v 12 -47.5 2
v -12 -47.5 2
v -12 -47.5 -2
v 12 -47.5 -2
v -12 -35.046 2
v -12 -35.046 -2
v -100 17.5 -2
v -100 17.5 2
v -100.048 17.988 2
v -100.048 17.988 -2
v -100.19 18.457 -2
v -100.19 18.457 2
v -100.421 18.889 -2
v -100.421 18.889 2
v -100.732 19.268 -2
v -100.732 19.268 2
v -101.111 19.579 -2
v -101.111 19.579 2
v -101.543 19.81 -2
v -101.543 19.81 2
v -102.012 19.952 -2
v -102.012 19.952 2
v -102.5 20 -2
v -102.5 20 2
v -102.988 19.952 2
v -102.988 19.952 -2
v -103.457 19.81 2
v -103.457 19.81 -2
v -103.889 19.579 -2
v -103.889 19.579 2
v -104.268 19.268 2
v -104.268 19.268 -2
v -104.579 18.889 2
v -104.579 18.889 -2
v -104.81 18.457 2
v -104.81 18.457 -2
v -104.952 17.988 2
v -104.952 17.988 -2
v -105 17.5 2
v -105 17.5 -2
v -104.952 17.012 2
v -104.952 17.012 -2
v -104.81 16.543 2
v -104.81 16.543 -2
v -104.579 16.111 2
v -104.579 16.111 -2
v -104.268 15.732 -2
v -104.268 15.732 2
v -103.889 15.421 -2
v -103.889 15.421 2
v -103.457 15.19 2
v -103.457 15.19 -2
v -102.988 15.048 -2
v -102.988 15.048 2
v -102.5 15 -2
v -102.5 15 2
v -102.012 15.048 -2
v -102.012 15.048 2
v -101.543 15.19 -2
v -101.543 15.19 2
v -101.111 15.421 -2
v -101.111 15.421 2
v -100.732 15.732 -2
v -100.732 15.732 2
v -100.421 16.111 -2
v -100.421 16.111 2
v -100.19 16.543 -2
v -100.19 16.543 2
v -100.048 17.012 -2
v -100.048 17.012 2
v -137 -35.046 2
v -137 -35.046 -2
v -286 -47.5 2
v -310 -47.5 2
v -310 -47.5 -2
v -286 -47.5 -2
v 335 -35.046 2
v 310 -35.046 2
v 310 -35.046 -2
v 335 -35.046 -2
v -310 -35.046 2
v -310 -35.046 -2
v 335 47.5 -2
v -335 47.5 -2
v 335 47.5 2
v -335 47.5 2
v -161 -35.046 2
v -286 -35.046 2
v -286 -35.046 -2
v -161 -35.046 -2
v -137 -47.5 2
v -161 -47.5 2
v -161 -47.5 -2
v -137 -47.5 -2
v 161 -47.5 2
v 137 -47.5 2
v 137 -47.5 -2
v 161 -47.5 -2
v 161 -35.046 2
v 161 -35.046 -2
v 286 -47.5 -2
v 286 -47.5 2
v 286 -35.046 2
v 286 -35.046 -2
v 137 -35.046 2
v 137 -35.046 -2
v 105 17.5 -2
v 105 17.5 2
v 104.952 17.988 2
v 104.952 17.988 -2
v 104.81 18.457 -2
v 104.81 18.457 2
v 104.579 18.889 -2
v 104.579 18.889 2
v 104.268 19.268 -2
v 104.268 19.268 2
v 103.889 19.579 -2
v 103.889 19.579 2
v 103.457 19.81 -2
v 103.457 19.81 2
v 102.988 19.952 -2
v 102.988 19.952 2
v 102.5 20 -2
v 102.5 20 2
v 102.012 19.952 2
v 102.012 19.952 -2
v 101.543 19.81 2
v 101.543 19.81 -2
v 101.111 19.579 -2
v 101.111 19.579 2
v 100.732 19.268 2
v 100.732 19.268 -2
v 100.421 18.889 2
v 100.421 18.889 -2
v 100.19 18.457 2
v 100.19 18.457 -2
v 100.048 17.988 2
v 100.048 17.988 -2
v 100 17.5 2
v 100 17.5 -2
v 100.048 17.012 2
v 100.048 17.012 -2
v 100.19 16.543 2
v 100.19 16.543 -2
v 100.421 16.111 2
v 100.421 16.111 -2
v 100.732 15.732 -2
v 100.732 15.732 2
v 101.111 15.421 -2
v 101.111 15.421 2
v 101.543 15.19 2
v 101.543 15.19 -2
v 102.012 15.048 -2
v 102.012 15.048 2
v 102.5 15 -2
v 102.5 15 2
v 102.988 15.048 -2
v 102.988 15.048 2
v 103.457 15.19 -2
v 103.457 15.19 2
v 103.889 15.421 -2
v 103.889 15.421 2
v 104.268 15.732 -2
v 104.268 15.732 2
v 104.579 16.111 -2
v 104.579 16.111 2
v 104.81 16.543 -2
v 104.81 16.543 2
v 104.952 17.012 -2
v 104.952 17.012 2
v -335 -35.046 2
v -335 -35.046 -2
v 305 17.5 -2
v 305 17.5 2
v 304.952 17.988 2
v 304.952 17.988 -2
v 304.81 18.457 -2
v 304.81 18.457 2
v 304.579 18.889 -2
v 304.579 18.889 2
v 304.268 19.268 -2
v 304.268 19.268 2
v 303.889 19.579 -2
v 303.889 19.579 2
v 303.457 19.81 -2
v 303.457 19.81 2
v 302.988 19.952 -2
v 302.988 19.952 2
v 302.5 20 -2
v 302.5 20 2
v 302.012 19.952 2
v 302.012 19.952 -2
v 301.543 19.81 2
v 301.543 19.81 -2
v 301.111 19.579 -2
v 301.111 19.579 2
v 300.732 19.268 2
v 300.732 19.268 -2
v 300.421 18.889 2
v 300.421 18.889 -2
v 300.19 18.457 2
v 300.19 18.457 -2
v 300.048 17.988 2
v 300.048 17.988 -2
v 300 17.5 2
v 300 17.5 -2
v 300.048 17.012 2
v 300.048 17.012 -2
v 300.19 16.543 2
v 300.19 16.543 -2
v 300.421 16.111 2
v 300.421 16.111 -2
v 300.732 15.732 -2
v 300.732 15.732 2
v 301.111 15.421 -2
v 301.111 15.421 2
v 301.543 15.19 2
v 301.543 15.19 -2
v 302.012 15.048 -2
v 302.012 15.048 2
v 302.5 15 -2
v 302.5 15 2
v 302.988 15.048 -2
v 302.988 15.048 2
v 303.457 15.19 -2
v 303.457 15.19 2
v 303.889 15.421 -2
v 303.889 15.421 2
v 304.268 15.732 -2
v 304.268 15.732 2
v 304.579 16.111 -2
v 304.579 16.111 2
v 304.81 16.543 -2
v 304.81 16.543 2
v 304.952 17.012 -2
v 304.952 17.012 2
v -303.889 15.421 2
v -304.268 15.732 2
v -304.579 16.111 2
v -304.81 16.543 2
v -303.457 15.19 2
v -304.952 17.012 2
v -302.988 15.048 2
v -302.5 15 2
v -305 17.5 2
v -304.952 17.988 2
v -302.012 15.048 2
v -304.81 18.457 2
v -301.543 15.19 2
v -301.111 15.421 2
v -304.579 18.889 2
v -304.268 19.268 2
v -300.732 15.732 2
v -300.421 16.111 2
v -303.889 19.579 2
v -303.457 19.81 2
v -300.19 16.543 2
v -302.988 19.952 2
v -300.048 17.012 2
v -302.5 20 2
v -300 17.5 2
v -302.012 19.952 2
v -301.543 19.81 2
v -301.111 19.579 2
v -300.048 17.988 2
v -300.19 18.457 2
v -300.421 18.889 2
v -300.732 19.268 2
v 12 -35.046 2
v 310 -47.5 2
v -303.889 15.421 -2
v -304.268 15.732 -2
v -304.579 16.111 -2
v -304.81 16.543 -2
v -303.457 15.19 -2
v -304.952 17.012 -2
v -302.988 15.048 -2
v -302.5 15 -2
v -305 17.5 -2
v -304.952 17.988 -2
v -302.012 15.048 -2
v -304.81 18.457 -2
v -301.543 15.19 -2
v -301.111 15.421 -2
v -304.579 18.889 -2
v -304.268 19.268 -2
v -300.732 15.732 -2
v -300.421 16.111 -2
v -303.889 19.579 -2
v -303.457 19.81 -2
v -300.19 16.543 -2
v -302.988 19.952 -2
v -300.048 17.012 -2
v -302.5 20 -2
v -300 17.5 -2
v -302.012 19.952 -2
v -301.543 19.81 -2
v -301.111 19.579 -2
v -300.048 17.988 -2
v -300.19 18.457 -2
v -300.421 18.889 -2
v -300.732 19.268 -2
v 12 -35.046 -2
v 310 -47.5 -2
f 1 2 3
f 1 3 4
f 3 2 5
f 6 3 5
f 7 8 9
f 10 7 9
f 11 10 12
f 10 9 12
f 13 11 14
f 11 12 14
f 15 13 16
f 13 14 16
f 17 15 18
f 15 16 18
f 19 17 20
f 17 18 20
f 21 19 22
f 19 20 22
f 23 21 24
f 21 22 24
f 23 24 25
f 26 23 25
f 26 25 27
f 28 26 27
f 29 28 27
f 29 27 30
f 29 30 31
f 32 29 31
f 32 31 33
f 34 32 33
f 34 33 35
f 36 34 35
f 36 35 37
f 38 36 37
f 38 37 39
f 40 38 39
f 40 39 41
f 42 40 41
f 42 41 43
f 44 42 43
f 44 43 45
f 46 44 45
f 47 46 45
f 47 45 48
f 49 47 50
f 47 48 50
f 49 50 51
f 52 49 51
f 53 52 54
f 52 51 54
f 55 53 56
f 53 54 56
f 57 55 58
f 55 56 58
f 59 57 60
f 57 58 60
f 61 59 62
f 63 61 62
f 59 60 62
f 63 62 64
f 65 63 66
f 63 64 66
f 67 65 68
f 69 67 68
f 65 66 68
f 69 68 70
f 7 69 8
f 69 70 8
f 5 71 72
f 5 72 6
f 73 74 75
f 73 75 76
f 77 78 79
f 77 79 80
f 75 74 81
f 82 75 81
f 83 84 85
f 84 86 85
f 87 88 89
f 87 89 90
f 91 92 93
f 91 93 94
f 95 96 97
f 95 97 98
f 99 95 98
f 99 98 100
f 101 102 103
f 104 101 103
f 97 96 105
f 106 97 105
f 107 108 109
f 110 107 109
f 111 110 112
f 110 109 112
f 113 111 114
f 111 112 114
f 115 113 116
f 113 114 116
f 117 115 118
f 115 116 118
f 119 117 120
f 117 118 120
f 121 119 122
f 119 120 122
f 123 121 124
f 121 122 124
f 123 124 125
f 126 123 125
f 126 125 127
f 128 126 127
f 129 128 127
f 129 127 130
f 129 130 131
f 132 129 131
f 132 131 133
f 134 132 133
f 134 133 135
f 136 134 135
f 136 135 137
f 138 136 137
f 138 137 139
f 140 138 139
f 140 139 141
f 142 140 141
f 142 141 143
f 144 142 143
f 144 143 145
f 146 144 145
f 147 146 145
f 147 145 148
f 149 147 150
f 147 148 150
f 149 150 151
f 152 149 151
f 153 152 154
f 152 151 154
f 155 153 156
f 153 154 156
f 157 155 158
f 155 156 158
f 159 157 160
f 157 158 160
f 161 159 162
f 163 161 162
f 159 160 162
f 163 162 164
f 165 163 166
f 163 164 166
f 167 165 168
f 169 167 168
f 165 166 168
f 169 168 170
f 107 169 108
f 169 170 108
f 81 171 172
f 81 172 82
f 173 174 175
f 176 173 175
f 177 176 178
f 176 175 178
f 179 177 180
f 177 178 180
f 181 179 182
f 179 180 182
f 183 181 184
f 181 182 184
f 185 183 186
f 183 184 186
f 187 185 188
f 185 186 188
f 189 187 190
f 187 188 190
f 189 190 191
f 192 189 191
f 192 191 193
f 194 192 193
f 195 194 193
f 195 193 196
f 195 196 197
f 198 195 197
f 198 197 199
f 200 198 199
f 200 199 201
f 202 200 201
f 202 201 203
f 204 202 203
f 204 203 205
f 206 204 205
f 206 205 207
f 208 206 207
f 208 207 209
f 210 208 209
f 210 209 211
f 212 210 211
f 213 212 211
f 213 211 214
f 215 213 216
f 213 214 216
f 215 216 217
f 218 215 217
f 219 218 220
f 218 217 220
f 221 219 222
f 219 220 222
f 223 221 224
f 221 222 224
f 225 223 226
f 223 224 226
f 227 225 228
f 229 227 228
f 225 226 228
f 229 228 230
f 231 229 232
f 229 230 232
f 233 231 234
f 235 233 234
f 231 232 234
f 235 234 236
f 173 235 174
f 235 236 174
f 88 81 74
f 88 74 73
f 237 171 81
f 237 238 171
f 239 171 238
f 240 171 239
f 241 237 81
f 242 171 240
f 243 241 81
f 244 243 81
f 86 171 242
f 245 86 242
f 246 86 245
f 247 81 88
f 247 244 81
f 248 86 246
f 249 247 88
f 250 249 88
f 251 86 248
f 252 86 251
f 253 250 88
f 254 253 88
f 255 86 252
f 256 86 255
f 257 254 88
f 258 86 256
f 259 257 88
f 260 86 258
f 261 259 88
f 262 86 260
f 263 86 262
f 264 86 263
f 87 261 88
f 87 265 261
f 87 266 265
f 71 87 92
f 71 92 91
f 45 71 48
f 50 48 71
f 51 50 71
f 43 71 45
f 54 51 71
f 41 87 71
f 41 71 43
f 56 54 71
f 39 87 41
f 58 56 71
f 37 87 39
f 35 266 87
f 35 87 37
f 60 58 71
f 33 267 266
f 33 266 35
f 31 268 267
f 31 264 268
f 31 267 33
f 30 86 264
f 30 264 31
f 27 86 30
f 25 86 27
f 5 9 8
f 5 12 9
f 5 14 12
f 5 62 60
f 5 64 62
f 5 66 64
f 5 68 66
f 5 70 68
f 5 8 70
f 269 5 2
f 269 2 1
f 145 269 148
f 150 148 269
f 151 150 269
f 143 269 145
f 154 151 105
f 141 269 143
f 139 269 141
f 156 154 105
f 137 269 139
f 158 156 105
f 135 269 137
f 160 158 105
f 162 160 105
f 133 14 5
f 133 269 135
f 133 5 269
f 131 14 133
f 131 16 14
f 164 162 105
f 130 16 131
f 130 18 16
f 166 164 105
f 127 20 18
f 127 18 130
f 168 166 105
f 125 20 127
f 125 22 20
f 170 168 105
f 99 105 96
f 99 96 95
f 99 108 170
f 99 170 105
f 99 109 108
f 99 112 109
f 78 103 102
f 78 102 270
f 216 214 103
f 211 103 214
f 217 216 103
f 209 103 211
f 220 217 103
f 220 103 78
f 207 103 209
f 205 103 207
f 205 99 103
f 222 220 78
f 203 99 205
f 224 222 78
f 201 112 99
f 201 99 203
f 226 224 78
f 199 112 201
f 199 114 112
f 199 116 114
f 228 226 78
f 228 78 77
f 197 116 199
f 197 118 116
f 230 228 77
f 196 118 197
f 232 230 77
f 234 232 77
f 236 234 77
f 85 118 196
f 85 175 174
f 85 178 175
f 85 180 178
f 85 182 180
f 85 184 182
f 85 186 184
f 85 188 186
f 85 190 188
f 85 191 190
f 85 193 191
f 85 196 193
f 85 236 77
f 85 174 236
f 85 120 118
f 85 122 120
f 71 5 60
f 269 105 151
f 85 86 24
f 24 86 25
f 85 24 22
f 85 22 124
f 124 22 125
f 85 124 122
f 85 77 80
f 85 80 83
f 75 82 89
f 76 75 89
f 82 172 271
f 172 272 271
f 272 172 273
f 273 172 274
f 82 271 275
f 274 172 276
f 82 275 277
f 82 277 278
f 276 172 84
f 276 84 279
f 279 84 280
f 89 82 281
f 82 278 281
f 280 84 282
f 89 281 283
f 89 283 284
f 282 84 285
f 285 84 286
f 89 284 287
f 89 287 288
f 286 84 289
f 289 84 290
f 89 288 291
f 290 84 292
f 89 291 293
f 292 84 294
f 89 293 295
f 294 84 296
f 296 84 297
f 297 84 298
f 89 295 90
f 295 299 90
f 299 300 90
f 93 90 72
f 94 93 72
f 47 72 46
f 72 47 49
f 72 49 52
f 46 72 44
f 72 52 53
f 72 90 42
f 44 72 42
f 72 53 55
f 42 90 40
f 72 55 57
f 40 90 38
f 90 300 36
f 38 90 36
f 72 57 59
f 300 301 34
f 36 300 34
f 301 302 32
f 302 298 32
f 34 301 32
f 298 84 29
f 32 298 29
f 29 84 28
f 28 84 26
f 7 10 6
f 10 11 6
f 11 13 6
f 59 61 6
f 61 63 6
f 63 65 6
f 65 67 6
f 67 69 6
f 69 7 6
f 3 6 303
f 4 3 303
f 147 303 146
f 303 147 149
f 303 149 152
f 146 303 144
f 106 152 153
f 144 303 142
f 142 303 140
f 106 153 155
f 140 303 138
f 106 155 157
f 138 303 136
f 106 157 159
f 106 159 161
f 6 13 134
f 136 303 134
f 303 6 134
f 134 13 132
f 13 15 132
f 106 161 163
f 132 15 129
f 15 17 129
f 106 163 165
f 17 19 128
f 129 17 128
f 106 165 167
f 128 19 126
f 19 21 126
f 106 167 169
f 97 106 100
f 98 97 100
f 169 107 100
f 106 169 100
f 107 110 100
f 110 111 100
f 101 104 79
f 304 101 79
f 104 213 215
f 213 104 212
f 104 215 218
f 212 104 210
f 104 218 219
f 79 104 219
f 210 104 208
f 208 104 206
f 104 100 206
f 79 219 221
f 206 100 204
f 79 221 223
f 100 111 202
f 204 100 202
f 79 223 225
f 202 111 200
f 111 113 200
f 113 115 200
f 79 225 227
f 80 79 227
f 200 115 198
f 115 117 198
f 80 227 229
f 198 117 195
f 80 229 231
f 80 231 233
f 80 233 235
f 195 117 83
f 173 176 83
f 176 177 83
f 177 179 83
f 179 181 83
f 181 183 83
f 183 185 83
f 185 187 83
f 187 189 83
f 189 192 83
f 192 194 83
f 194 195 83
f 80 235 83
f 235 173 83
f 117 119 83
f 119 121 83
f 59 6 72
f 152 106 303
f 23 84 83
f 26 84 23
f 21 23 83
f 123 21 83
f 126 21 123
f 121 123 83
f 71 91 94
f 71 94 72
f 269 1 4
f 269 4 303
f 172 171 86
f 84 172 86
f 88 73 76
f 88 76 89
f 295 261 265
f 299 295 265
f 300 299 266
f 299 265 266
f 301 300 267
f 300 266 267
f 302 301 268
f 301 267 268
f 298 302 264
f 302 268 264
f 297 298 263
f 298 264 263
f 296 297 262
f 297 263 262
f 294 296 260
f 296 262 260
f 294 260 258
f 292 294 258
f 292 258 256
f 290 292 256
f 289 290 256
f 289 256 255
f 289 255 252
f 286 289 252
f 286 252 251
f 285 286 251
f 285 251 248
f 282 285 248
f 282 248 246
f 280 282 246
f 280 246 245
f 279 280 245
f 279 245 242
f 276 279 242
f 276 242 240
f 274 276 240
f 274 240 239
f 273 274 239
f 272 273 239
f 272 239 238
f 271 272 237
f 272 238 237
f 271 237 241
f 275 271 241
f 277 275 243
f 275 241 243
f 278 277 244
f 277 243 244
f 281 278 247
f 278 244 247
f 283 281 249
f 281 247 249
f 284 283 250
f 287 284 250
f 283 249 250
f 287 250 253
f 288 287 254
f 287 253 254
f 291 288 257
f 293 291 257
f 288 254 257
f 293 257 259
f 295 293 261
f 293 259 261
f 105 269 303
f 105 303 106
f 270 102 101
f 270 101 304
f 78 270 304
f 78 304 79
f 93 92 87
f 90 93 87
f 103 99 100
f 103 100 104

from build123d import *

# Parameters (mm, degrees)
SKETCH_1_W          = 670
SKETCH_1_H          = 95
EXTRUDE_1_DEPTH     = 2
SKETCH_2_W          = 125
SKETCH_2_H          = 12.454397838
CUT_EXTRUDE_1_DEPTH = 339.374422792
SKETCH_5_R          = 2.5
CUT_EXTRUDE_4_DEPTH = 339.374422792


with BuildPart() as part:
    # Эскиз1 → Бобышка-Вытянуть1 (new, symmetric)
    with BuildSketch(Plane.XY):
        Rectangle(SKETCH_1_W, SKETCH_1_H)
    extrude(amount=EXTRUDE_1_DEPTH, both=True)

    # Эскиз2 → Вырез-Вытянуть1 (cut, through all)
    with BuildSketch(Plane.XY.offset(2)):
        with Locations((-372.5, -41.272801081)):
            Rectangle(SKETCH_2_W, SKETCH_2_H)
        with Locations((-223.5, -41.272801081)):
            Rectangle(SKETCH_2_W, SKETCH_2_H)
        with Locations((-74.5, -41.272801081)):
            Rectangle(SKETCH_2_W, SKETCH_2_H)
        with Locations((74.5, -41.272801081)):
            Rectangle(SKETCH_2_W, SKETCH_2_H)
        with Locations((223.5, -41.272801081)):
            Rectangle(SKETCH_2_W, SKETCH_2_H)
        with Locations((372.5, -41.272801081)):
            Rectangle(SKETCH_2_W, SKETCH_2_H)
    extrude(amount=-CUT_EXTRUDE_1_DEPTH, mode=Mode.SUBTRACT)

    # Эскиз5 → Вырез-Вытянуть4 (cut, through all)
    with BuildSketch(Plane.XY.offset(2)):
        with Locations((-102.5, 17.5)):
            Circle(SKETCH_5_R)
        with Locations((102.5, 17.5)):
            Circle(SKETCH_5_R)
        with Locations((-302.5, 17.5)):
            Circle(SKETCH_5_R)
        with Locations((302.5, 17.5)):
            Circle(SKETCH_5_R)
    extrude(amount=-CUT_EXTRUDE_4_DEPTH, mode=Mode.SUBTRACT)


solid = part.part
